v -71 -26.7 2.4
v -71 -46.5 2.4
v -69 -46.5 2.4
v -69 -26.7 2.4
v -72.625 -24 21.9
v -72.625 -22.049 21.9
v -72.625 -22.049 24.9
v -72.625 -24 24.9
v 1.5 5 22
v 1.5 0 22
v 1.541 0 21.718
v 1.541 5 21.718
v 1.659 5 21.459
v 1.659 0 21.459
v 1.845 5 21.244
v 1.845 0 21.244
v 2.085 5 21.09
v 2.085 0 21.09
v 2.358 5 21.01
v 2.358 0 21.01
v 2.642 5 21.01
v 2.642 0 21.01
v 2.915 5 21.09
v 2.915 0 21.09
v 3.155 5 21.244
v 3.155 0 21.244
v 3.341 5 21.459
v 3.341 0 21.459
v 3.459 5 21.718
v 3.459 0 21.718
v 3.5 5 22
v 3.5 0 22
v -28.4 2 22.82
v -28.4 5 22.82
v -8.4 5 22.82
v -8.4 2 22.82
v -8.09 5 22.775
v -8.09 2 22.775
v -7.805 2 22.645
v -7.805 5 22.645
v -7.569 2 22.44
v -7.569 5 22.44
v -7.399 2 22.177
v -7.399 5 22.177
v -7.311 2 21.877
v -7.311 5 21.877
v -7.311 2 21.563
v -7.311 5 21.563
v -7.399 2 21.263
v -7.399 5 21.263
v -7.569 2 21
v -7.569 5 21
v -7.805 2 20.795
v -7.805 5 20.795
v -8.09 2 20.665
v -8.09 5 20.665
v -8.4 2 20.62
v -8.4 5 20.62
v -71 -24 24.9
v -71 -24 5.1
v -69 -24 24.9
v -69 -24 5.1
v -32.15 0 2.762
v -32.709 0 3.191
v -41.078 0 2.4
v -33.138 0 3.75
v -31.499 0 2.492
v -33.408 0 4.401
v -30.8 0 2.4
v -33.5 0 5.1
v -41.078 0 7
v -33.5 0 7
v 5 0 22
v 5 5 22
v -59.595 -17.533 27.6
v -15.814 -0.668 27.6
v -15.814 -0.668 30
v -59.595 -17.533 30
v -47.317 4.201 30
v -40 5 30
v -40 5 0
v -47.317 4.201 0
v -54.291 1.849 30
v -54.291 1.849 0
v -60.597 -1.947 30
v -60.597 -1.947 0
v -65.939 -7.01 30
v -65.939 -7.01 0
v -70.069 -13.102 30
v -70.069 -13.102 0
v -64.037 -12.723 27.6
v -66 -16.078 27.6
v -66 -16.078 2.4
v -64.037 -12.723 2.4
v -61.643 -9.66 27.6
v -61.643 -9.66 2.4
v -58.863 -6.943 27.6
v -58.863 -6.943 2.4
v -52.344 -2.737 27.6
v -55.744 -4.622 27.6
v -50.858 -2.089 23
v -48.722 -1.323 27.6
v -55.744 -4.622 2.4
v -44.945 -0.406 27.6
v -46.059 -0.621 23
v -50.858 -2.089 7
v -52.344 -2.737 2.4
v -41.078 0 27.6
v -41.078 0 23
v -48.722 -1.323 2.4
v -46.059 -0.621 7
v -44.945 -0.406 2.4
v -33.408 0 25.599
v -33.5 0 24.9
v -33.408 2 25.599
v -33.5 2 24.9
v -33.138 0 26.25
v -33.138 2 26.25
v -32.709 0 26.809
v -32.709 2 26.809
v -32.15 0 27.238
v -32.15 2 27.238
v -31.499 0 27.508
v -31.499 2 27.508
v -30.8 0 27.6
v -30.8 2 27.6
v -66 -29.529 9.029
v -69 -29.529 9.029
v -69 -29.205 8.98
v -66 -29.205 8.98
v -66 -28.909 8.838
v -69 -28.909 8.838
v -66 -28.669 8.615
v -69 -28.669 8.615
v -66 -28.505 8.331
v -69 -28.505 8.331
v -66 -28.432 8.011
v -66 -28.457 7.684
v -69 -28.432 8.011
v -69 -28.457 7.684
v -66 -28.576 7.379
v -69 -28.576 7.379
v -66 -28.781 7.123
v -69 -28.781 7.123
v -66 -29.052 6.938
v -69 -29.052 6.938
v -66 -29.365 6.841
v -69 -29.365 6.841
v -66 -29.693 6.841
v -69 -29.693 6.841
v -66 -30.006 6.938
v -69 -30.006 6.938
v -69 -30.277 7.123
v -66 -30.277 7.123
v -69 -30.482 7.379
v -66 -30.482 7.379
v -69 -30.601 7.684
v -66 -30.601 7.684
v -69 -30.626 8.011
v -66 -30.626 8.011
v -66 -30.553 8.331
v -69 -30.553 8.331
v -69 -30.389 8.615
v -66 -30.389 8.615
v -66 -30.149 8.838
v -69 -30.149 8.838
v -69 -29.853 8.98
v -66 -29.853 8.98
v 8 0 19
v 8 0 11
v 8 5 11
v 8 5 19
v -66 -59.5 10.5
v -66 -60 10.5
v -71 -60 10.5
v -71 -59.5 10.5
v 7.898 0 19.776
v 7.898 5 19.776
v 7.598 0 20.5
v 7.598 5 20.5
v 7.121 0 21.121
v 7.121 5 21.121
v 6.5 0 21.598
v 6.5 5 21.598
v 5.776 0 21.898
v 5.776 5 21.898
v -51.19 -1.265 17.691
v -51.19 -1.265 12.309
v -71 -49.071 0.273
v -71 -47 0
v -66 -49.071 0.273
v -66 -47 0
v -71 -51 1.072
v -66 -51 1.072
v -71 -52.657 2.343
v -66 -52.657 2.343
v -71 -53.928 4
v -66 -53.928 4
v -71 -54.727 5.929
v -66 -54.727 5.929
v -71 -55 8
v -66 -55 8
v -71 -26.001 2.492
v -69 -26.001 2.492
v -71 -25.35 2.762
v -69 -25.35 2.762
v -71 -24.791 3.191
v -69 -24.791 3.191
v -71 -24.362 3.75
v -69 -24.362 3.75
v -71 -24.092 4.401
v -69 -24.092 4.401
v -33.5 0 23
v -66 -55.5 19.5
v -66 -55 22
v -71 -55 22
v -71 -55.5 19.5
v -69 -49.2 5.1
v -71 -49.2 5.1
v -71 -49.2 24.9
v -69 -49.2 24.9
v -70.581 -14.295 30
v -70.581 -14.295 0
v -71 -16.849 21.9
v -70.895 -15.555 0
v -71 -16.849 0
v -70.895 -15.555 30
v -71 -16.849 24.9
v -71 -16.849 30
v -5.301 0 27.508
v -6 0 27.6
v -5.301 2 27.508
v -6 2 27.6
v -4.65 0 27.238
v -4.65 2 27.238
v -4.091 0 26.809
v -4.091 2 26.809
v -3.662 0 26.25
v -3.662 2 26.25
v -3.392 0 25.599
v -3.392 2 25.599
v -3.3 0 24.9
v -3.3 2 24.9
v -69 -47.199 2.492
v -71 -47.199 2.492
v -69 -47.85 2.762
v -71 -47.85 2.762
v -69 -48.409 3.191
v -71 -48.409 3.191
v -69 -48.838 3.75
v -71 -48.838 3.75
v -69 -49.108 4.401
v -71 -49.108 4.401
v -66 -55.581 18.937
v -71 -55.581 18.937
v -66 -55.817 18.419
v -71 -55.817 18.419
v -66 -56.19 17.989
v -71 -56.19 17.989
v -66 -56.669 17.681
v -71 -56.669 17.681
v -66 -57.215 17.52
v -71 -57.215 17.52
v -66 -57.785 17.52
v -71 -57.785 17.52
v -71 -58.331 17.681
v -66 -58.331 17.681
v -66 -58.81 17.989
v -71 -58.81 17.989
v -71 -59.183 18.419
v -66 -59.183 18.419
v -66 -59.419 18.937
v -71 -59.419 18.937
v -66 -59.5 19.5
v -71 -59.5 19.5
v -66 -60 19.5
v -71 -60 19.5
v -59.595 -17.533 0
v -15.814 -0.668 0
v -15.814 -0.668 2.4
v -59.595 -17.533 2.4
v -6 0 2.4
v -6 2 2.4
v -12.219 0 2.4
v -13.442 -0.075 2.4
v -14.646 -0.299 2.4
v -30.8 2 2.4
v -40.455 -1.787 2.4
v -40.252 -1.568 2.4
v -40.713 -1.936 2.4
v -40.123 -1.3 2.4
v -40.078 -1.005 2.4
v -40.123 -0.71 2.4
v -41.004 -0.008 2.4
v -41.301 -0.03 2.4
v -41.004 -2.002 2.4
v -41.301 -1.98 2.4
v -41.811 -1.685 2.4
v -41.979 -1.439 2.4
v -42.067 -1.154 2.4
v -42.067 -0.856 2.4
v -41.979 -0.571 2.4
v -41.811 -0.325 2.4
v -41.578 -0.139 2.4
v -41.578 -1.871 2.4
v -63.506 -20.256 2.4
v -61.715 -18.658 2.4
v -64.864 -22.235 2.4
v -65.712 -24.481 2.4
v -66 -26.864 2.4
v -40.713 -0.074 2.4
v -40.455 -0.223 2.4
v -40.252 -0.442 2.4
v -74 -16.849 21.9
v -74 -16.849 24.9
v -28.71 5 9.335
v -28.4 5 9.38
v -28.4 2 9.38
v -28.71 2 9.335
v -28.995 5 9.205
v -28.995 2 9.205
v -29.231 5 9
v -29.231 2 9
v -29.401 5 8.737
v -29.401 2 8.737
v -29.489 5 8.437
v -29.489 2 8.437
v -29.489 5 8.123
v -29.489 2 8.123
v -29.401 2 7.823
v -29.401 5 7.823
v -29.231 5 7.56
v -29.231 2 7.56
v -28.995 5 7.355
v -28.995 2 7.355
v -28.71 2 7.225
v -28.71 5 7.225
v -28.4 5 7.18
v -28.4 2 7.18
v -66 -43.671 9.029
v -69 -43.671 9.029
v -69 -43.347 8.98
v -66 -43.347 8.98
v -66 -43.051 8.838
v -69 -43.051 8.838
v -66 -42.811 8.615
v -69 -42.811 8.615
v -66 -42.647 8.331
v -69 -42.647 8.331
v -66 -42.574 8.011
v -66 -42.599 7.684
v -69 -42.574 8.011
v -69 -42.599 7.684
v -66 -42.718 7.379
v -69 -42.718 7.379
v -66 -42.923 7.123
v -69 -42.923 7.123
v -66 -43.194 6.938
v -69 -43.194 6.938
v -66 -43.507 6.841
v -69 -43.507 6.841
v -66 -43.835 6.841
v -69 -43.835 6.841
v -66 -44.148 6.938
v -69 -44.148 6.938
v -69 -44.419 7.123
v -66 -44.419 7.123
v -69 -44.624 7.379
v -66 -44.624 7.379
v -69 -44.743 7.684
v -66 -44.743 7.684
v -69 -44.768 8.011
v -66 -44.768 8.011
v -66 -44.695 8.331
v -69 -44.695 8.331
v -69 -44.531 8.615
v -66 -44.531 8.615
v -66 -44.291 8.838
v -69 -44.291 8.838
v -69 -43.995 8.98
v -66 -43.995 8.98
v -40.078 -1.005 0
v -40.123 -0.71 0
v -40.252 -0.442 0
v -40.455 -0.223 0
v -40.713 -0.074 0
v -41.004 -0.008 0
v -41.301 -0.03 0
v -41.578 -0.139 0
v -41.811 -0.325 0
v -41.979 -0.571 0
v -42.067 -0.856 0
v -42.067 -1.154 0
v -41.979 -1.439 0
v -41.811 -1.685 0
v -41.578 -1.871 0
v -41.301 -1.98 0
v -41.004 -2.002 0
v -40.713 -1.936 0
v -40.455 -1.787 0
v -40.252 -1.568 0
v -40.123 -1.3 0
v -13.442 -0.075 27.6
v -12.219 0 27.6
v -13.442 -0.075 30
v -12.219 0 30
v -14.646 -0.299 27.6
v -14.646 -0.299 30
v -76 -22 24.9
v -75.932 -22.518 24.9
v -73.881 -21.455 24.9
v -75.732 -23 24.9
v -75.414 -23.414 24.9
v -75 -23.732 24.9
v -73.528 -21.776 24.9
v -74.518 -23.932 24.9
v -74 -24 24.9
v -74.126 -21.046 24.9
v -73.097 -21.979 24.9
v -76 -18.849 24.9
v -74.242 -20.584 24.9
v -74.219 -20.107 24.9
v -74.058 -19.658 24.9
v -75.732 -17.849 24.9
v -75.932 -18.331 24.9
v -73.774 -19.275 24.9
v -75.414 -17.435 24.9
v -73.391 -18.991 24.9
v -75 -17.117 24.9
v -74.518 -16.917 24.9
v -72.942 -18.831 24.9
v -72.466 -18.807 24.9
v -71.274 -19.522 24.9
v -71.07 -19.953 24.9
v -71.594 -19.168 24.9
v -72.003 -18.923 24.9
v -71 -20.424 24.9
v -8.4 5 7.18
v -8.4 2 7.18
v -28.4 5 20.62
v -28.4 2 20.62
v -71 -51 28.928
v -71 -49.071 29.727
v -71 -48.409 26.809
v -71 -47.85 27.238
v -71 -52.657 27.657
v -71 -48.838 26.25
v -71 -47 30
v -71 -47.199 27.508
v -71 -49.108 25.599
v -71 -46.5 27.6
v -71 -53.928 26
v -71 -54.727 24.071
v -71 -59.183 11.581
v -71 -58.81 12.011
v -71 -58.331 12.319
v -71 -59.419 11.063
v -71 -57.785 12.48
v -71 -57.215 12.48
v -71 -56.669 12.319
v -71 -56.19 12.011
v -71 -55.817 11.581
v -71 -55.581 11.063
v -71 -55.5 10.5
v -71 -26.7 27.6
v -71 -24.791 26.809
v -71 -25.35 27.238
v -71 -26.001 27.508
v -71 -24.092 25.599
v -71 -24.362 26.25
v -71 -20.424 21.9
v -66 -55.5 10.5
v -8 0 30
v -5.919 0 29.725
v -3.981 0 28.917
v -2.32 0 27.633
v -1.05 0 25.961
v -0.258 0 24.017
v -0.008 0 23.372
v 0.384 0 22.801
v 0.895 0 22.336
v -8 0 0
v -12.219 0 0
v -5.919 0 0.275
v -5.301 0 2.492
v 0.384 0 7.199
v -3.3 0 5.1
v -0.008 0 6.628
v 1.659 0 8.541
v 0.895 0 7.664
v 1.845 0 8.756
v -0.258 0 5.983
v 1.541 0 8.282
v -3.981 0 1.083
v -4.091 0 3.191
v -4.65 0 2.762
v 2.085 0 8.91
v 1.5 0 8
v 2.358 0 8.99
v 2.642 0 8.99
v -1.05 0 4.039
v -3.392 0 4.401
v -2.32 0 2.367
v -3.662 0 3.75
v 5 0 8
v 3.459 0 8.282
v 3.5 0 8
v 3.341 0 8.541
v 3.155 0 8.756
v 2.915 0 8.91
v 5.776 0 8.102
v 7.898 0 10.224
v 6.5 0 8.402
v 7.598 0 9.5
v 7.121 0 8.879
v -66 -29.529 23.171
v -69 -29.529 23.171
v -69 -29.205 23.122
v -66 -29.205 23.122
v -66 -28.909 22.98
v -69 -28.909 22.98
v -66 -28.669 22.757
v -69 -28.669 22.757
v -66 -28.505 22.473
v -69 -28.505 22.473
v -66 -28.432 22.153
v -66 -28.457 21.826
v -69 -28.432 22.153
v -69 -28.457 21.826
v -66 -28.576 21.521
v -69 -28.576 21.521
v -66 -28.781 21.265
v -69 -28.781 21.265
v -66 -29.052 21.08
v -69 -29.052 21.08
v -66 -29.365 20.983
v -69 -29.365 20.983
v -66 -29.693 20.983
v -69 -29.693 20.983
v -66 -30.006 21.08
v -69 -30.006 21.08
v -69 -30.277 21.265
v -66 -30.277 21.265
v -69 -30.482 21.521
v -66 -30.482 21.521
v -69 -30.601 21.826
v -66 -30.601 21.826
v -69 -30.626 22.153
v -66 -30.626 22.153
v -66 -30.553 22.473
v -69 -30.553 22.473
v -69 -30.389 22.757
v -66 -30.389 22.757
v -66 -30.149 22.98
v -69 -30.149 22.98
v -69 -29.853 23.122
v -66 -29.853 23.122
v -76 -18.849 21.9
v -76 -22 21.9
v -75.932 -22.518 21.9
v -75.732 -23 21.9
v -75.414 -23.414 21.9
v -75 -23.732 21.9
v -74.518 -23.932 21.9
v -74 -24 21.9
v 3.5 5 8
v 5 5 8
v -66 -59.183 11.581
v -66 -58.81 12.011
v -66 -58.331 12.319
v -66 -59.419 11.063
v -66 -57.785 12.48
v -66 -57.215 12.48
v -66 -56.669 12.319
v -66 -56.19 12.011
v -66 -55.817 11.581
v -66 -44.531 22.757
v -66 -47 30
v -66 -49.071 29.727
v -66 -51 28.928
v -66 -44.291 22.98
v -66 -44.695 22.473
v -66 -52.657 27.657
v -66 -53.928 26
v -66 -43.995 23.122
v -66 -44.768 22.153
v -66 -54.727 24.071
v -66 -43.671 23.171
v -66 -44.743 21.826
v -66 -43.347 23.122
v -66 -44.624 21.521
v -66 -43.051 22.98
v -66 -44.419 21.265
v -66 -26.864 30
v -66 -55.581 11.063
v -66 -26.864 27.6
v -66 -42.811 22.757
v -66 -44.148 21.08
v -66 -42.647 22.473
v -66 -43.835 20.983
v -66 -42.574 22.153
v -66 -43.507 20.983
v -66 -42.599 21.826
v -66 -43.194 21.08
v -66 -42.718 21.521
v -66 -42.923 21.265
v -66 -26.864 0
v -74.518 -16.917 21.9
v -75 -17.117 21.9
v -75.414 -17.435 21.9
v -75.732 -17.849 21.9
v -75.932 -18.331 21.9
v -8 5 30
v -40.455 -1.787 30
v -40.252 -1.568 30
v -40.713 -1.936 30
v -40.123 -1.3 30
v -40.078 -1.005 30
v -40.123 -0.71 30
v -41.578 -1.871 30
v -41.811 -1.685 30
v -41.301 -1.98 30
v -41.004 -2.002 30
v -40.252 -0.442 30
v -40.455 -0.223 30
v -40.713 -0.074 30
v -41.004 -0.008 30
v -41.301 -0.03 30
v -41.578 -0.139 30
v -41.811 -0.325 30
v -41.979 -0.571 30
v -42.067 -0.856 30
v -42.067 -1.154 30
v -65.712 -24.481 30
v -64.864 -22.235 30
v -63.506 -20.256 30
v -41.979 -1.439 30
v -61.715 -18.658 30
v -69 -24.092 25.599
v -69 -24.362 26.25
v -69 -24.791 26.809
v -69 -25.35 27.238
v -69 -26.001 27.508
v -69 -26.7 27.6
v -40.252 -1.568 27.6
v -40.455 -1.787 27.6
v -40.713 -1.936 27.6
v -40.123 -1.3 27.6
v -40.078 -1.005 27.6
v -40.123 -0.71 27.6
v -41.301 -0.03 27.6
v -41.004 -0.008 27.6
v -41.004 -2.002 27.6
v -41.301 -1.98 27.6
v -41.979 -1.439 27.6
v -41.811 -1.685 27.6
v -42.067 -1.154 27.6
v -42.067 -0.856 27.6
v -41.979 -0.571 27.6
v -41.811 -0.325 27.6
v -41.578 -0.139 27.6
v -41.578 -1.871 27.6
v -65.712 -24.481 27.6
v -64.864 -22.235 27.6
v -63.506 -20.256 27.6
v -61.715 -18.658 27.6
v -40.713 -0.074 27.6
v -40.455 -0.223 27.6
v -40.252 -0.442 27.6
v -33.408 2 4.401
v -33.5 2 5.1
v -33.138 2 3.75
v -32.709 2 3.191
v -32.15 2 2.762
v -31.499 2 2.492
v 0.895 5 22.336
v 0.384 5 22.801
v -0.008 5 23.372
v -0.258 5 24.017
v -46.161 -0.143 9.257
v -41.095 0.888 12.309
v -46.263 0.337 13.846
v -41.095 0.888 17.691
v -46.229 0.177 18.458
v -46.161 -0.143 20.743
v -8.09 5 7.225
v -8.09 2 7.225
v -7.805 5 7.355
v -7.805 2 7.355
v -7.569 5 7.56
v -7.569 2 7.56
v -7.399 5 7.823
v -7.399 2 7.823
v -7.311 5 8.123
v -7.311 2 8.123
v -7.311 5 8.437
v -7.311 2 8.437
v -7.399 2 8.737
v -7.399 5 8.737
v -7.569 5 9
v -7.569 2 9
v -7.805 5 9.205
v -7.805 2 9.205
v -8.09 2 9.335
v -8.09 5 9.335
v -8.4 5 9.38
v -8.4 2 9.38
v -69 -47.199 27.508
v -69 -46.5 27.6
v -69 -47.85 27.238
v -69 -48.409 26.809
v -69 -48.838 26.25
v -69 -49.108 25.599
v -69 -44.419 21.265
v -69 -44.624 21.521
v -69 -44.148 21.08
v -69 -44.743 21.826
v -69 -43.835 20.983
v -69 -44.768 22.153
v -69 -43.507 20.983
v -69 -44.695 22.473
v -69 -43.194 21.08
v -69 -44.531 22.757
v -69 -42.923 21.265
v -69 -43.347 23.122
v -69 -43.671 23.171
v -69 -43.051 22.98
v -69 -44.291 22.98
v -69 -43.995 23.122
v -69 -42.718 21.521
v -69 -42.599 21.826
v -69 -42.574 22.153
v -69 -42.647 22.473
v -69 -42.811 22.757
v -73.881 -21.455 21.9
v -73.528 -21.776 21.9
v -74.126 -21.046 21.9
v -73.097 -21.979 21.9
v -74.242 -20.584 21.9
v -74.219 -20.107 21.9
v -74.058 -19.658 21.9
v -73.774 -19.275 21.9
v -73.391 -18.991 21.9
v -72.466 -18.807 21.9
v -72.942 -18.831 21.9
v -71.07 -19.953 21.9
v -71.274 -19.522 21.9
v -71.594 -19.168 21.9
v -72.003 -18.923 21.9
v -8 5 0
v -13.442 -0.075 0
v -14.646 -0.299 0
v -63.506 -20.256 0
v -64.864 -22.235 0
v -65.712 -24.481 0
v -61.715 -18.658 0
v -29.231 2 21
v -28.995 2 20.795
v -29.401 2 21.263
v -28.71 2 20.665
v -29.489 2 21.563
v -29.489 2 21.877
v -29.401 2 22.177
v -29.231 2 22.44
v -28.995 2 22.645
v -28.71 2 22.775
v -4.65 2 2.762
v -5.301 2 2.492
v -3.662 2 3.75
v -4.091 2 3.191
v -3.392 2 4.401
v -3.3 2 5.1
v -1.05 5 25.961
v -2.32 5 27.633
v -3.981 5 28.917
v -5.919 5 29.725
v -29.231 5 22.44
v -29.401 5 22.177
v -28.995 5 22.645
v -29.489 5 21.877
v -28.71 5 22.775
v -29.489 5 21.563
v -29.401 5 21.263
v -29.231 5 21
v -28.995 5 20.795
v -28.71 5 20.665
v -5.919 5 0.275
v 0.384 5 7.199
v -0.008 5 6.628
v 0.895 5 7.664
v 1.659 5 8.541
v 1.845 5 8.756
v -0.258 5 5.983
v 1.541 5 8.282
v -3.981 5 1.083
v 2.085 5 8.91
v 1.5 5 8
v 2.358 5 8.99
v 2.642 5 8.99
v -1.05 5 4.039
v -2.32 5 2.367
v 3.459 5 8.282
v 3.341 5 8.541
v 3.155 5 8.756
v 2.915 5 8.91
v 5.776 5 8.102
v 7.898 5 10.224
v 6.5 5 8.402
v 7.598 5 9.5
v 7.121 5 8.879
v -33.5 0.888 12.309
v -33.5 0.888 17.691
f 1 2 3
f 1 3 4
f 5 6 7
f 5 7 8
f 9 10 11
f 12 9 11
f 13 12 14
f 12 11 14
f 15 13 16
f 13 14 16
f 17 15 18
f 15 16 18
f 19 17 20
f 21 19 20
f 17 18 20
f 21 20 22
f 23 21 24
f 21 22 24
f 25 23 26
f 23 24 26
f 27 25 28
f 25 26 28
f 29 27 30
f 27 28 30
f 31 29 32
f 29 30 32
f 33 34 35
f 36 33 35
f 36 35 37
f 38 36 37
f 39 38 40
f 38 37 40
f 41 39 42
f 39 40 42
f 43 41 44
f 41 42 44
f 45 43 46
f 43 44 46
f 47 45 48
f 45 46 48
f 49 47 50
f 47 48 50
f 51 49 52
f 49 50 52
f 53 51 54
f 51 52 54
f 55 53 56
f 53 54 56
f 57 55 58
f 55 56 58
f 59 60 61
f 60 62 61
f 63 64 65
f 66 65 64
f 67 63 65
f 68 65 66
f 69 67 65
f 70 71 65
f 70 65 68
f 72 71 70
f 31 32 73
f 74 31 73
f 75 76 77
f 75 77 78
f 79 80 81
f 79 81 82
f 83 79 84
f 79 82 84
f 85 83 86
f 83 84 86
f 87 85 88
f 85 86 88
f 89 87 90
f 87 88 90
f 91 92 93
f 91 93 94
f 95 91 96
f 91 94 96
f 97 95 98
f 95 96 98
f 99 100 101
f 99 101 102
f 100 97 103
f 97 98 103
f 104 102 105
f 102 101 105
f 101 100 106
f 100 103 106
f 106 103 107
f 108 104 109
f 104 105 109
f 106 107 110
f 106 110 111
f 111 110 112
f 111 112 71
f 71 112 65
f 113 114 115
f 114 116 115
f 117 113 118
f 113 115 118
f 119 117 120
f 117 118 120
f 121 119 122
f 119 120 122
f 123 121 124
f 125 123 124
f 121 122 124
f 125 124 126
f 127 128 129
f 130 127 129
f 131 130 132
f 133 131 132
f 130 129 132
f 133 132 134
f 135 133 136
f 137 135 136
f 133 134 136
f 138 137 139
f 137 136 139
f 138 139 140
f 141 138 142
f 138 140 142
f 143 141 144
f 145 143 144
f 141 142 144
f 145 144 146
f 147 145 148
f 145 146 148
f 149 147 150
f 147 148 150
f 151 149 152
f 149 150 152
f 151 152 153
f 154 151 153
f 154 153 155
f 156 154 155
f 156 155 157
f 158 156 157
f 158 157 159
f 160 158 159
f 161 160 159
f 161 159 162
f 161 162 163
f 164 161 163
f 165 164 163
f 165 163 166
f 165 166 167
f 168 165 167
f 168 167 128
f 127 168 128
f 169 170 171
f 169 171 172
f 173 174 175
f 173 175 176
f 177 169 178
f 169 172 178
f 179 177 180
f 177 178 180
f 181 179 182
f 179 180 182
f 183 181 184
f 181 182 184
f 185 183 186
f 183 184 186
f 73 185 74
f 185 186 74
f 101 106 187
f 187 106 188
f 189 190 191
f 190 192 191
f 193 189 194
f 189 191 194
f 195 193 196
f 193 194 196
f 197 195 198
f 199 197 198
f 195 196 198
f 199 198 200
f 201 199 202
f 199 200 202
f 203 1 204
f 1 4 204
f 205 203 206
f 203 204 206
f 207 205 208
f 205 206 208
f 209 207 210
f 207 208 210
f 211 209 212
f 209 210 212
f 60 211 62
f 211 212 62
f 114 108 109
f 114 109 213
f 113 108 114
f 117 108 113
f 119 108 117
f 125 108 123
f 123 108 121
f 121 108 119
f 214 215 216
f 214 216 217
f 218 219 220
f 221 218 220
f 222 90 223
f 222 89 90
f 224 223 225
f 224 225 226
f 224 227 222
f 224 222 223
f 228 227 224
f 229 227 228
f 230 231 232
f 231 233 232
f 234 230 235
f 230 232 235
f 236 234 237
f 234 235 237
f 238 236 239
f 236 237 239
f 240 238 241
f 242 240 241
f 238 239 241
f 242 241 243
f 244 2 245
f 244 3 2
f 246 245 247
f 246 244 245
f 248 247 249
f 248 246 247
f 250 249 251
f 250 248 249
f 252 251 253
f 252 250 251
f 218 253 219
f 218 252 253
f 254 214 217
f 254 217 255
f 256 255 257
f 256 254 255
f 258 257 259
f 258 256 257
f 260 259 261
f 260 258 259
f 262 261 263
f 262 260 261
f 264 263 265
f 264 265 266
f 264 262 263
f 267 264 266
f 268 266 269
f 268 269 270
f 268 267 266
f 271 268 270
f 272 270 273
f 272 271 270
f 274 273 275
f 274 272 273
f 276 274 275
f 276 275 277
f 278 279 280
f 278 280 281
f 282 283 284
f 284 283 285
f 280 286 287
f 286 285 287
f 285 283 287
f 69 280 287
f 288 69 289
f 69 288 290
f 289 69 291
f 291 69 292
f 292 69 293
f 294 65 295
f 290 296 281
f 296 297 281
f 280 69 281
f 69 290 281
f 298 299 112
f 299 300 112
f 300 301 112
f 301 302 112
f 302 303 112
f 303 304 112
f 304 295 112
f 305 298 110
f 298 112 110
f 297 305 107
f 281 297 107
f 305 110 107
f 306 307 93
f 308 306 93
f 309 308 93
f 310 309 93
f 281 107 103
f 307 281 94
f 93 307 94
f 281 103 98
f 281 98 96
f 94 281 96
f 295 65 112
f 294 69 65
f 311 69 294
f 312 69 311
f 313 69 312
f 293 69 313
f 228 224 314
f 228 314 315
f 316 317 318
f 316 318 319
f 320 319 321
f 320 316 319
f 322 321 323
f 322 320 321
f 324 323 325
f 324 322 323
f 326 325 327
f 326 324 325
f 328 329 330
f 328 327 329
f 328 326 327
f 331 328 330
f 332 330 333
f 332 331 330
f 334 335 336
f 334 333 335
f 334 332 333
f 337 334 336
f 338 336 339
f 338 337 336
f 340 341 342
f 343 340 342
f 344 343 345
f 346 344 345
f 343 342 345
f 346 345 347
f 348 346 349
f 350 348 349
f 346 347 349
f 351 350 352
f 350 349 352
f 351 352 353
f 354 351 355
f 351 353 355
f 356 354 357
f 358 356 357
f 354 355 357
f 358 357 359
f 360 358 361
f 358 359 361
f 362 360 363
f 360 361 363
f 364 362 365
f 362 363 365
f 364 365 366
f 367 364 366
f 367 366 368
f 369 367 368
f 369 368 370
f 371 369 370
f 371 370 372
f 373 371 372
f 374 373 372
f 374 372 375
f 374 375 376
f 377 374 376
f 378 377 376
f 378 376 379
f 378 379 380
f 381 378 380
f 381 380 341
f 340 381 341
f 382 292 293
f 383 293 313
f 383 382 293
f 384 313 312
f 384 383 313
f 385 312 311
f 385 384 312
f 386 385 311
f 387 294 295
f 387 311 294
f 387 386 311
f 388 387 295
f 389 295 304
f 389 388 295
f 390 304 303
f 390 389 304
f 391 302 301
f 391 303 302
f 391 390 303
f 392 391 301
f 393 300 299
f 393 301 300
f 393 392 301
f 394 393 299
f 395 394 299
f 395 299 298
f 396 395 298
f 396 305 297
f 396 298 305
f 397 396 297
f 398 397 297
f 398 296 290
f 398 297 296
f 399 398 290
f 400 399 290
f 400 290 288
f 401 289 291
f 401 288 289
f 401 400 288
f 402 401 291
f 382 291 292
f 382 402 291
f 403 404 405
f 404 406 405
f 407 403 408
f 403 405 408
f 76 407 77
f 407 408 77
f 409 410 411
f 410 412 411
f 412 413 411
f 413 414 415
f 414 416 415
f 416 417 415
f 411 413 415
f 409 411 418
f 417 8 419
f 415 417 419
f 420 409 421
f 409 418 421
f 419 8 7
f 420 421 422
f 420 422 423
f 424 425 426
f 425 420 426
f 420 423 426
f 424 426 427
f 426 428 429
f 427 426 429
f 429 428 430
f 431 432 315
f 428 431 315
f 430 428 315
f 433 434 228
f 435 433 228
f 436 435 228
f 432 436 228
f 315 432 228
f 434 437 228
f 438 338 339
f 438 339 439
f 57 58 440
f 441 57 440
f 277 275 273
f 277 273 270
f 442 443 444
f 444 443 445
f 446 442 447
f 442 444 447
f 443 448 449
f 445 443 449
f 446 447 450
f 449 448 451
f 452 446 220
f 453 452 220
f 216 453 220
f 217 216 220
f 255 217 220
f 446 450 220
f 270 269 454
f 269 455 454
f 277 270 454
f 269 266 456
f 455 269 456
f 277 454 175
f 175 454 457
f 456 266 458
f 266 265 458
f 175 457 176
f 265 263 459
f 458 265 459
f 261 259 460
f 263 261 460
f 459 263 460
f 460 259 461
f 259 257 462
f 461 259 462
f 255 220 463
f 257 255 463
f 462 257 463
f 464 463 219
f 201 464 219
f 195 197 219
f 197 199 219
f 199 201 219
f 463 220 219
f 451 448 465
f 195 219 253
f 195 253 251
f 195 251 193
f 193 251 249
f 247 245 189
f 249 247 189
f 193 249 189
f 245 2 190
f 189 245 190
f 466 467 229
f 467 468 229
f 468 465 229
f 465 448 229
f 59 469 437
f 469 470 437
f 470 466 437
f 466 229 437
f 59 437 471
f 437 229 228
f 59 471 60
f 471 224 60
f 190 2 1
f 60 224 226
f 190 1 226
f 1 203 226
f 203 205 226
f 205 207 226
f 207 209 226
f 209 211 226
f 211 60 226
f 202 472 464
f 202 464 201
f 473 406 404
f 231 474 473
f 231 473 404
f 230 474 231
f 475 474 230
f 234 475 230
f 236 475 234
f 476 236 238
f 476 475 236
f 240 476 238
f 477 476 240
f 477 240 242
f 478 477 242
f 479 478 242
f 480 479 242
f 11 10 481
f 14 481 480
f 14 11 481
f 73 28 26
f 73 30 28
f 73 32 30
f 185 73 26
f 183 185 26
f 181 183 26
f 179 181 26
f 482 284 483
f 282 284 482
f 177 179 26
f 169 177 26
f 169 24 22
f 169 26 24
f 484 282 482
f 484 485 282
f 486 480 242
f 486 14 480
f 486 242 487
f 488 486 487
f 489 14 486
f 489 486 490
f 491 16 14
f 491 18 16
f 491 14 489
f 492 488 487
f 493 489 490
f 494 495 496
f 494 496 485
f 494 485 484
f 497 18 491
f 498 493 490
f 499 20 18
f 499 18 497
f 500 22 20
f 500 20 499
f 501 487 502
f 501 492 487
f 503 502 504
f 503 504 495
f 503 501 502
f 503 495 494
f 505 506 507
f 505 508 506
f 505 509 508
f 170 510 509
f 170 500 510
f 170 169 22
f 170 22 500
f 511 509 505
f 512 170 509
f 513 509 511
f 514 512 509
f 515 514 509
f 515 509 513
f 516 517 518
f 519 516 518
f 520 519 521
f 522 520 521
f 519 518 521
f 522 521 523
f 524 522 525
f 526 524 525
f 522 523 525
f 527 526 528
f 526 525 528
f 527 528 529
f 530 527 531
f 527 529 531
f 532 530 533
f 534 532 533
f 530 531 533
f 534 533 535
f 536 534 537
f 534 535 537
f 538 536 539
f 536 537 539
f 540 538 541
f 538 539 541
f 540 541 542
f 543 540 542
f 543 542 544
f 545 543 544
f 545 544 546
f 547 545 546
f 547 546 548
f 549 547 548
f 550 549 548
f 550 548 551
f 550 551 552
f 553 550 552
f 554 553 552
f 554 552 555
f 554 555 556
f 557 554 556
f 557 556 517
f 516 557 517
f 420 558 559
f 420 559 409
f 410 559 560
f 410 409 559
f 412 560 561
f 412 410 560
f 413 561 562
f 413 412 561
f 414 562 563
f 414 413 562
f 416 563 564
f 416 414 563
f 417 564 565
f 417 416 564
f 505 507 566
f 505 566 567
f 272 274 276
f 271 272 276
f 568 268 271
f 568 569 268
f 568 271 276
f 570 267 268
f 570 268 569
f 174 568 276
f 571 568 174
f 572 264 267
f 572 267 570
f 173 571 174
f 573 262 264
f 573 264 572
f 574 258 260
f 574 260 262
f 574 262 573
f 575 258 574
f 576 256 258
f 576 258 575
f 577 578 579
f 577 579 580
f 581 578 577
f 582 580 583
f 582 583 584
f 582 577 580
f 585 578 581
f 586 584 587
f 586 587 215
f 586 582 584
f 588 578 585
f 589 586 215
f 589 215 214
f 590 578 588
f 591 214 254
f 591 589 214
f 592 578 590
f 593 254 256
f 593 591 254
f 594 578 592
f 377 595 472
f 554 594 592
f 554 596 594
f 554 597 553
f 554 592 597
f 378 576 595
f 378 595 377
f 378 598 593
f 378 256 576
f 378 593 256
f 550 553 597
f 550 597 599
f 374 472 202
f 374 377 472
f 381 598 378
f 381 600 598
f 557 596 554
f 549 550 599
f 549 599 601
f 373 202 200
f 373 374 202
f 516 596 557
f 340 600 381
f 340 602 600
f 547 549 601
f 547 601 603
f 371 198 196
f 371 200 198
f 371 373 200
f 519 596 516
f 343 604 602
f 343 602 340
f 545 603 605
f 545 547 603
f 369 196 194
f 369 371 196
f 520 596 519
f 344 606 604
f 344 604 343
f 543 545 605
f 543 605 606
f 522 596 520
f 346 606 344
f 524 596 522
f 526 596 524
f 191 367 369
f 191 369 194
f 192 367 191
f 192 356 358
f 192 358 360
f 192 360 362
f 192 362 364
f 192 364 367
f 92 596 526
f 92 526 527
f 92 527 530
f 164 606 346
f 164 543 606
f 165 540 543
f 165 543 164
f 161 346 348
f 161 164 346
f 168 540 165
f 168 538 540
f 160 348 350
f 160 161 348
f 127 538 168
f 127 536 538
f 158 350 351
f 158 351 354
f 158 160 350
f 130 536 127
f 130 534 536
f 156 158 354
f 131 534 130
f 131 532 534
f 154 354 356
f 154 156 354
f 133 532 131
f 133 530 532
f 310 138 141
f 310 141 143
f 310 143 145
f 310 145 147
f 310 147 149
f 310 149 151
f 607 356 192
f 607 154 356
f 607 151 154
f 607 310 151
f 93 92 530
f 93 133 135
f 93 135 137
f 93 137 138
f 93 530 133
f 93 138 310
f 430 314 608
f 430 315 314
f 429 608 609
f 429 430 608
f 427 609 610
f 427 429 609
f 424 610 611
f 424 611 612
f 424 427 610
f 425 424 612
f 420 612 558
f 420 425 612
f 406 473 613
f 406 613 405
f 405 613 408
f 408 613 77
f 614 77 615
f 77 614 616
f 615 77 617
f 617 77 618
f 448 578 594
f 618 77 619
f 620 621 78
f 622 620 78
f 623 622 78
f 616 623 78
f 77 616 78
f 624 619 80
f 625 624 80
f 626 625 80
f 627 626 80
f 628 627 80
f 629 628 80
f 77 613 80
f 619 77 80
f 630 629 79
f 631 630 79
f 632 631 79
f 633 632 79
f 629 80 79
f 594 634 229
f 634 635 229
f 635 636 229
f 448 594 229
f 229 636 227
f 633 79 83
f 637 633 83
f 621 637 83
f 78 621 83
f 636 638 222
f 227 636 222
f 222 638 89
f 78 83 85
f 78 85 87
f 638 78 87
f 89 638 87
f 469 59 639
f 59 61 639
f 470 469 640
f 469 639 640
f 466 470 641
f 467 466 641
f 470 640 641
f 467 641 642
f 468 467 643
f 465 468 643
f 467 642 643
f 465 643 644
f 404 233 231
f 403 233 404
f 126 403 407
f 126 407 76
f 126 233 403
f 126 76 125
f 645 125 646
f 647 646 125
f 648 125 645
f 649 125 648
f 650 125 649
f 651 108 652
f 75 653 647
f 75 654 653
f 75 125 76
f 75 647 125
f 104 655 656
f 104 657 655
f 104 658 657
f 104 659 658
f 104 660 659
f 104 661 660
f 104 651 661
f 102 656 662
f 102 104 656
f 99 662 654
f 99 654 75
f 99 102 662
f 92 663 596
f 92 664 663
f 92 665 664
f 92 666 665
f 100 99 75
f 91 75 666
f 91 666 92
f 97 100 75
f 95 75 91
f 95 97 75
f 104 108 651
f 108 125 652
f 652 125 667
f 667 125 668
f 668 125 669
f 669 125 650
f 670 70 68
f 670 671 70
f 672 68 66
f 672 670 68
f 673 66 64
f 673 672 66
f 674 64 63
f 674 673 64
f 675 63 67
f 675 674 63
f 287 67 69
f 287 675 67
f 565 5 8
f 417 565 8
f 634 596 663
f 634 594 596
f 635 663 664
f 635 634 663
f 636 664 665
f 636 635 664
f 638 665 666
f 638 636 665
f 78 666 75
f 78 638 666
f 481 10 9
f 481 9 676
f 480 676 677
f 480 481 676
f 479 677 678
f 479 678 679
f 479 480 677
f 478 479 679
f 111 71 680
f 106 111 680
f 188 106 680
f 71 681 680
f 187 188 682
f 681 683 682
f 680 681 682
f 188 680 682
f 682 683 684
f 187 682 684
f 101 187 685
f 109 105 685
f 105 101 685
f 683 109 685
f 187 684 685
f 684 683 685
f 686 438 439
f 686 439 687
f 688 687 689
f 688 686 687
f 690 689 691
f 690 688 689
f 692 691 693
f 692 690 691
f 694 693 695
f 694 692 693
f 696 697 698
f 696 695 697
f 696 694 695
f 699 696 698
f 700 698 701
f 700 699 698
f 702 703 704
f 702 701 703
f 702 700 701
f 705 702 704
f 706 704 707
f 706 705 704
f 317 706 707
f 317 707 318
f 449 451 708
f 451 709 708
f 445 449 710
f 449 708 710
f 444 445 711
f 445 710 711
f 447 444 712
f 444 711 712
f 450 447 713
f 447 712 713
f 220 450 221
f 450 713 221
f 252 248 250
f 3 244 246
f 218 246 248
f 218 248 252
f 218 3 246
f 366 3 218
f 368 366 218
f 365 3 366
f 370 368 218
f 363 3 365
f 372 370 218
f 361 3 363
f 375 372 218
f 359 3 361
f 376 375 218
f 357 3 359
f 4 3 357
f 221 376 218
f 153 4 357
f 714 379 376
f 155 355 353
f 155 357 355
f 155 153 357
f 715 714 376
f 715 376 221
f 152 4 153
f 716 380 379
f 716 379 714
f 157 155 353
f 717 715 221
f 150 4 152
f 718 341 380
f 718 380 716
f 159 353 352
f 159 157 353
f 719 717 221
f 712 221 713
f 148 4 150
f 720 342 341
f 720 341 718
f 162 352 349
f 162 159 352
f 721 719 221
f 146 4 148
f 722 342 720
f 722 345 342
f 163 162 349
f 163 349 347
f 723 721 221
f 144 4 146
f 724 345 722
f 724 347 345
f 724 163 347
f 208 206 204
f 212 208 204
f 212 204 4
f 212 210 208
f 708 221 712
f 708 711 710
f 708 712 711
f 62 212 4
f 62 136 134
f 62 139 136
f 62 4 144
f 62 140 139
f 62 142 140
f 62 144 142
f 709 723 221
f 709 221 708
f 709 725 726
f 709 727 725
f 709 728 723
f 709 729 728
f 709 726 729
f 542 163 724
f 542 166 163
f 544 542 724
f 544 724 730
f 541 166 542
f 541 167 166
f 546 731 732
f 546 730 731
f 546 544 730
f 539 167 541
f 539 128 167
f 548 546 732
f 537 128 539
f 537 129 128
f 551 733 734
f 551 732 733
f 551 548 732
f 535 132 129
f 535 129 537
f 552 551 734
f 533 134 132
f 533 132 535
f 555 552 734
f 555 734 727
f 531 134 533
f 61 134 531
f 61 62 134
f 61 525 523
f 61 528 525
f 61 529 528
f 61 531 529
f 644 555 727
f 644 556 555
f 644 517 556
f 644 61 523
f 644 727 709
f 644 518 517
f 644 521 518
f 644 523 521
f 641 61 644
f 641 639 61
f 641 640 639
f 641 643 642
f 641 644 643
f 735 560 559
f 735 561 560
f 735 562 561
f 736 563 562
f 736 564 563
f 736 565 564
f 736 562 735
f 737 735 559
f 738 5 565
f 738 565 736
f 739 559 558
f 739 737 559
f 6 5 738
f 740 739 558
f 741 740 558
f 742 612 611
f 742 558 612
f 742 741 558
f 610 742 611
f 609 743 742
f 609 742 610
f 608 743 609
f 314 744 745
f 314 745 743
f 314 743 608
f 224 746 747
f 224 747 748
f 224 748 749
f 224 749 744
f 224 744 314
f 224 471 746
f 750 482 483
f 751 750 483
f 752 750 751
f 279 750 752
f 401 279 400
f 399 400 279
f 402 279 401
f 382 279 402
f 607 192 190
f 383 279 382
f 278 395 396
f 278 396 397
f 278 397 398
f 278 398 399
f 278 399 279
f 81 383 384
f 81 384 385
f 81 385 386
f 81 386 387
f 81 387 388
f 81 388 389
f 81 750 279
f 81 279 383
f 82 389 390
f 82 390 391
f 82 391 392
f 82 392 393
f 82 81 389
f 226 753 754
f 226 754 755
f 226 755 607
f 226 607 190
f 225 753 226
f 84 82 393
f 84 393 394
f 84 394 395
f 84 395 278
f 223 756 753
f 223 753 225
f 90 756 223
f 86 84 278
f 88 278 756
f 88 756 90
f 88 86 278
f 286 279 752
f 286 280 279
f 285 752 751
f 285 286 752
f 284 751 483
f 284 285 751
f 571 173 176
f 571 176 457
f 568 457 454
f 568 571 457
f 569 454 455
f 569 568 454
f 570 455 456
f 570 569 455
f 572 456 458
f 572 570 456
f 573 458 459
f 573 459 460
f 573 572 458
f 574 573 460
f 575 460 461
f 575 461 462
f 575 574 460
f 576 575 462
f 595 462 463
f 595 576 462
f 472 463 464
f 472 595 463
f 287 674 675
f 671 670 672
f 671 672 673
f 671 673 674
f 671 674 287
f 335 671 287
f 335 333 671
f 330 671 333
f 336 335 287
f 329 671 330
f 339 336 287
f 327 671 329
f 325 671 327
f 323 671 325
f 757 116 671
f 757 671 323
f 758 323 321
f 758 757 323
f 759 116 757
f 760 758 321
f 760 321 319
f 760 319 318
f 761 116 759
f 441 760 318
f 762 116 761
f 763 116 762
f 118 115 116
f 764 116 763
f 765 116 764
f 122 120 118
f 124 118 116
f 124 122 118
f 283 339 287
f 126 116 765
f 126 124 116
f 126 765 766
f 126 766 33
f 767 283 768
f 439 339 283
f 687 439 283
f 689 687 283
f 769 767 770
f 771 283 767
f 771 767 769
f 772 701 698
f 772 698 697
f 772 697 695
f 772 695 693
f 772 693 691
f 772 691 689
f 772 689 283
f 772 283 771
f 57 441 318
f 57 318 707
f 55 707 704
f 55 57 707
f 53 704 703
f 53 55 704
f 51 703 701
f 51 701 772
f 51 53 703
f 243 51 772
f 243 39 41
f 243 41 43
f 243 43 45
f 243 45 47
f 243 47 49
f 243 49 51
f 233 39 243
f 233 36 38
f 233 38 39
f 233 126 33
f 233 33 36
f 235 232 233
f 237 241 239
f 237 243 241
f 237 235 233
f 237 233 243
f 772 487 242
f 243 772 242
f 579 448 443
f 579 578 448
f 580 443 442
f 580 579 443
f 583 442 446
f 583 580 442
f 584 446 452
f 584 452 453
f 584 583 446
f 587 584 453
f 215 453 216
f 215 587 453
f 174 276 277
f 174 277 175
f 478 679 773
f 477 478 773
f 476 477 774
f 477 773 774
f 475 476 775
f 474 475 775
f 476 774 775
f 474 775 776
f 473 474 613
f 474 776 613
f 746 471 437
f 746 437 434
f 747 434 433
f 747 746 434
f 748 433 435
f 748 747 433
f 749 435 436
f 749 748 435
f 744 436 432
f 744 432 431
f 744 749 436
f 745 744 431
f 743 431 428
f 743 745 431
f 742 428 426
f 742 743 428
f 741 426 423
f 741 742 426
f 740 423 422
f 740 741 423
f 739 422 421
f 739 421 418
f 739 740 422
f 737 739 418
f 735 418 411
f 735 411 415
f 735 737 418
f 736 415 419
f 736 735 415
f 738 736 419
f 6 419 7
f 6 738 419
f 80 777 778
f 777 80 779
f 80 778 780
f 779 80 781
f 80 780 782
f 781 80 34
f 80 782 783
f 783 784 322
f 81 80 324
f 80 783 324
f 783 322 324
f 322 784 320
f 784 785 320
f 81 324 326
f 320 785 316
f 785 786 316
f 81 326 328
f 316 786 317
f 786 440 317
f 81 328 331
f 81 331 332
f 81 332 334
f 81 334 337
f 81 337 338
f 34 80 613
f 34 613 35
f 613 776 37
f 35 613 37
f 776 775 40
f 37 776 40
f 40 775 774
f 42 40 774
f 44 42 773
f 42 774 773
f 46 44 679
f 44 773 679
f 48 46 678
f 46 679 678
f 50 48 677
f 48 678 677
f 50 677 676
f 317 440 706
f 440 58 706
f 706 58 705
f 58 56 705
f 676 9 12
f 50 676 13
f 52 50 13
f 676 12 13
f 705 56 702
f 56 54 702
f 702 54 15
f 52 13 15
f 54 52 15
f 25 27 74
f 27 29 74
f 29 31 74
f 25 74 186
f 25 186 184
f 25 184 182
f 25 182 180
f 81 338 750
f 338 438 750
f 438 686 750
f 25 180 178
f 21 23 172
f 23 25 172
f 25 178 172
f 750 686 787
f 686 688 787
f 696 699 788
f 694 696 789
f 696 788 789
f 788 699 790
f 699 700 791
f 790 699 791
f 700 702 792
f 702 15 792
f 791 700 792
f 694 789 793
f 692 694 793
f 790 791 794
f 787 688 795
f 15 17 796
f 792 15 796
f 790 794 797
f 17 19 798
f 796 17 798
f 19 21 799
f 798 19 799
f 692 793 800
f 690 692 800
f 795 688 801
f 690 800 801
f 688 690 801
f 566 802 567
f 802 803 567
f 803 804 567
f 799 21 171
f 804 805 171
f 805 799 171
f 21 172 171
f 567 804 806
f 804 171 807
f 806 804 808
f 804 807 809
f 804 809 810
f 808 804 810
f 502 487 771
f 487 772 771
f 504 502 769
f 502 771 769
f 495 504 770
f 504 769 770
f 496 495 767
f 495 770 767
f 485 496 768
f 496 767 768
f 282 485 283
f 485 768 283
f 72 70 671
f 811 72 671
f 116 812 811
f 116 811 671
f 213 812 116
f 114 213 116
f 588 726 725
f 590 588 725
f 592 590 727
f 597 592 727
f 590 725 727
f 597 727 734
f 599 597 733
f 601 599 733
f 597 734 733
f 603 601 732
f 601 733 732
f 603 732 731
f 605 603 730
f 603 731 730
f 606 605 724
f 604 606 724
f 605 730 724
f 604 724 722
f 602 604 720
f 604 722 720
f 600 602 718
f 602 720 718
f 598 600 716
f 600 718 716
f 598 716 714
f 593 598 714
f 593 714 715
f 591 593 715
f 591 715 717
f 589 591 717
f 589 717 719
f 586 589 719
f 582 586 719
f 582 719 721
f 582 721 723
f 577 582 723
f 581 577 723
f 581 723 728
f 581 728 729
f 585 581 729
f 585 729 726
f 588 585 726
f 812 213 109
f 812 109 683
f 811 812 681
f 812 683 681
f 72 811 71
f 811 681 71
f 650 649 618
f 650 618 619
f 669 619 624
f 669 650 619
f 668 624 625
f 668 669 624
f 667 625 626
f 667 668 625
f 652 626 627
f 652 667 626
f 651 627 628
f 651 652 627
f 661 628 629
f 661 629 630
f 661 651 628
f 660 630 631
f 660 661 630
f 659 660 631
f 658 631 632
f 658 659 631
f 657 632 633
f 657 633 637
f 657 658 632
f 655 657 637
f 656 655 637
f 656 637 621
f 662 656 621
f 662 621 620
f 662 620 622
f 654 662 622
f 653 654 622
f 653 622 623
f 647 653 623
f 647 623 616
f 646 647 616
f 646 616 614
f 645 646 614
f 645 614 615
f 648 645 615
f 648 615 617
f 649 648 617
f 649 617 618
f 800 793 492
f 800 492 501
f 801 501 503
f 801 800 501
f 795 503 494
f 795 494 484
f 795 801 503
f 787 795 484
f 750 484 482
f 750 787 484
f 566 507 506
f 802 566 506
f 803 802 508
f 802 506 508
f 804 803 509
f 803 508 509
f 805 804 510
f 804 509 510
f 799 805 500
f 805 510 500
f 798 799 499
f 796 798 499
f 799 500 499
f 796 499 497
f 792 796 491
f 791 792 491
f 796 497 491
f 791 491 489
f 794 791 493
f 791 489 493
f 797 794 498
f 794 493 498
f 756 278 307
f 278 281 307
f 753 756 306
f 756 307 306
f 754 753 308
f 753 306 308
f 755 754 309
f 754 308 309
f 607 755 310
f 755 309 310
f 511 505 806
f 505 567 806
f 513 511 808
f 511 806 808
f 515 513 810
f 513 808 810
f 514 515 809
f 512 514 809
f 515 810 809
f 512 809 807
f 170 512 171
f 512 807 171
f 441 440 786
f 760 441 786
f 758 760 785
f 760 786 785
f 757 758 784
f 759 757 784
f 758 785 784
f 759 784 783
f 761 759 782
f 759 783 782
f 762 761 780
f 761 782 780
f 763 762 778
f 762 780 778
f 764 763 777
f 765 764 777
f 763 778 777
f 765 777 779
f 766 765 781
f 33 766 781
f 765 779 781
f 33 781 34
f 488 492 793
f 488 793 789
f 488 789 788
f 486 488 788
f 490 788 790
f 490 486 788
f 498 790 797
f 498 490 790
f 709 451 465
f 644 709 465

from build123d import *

# Parameters (mm, degrees)
SALIENTE_EXTRUIR1_DEPTH = 30
CORTAR_EXTRUIR1_DEPTH   = 5
CROQUIS3_W              = 30.2
CROQUIS3_H              = 25.2
CORTAR_EXTRUIR2_DEPTH   = 2
CROQUIS4_R              = 1.1
CORTAR_EXTRUIR3_DEPTH   = 5
CROQUIS5_W              = 25.2
CROQUIS5_H              = 25.2
CORTAR_EXTRUIR4_DEPTH   = 2
REDONDEO2_R             = 8
REDONDEO3_R             = 2.7
CROQUIS6_W              = 8
CROQUIS6_H              = 14
SALIENTE_EXTRUIR2_DEPTH = 5
REDONDEO4_R             = 3
SALIENTE_EXTRUIR4_START = -2.4
SALIENTE_EXTRUIR4_DEPTH = 2.4
SALIENTE_EXTRUIR5_START = -30
SALIENTE_EXTRUIR5_DEPTH = 2.4
REDONDEO5_R             = 10
SALIENTE_EXTRUIR6_START = -5
SALIENTE_EXTRUIR6_DEPTH = 5
CORTAR_EXTRUIR6_START   = -2.4
CROQUIS14_R             = 1
CORTAR_EXTRUIR6_DEPTH   = 30
CROQUIS18_W             = 3
CROQUIS18_H             = 7.151114147
SALIENTE_EXTRUIR7_DEPTH = 5
CORTAR_EXTRUIR7_START   = -3
CORTAR_EXTRUIR7_DEPTH   = 3
CROQUIS22_R             = 1
CORTAR_EXTRUIR8_DEPTH   = 5
REDONDEO8_R             = 2
REDONDEO6_R             = 3


with BuildPart() as part:
    # Croquis1 → Saliente-Extruir1 (new body)
    with BuildSketch(Plane.XY):
        with BuildLine():
            Line((0, 0), (0, 5))
            Line((0, 5), (-40, 5))
            ThreePointArc((-40, 5), (-58.443639467, -0.437358826), (-71, -15))
            Line((-71, -15), (-71, -55))
            Line((-71, -55), (-66, -55))
            Line((-66, -55), (-66, -16.078431373))
            ThreePointArc((-66, -16.078431373), (-55.744135615, -4.621589797), (-41.078431373, 0))
            Line((-41.078431373, 0), (0, 0))
        make_face()
    extrude(amount=SALIENTE_EXTRUIR1_DEPTH)

    # Croquis2 → Cortar-Extruir1 (cut)
    with BuildSketch(Plane(origin=(0, 5, 0), x_dir=(1, 0, 0), z_dir=(0, 1, 0))):
        with BuildLine():
            Line((-18.4, -7.18), (-8.4, -7.18))
            ThreePointArc((-8.4, -7.18), (-7.3, -8.28), (-8.4, -9.38))
            Line((-8.4, -9.38), (-28.4, -9.38))
            ThreePointArc((-28.4, -9.38), (-29.5, -8.28), (-28.4, -7.18))
            Line((-28.4, -7.18), (-18.4, -7.18))
        make_face()
        with BuildLine():
            Line((-8.4, -20.62), (-28.4, -20.62))
            ThreePointArc((-28.4, -20.62), (-29.5, -21.72), (-28.4, -22.82))
            Line((-28.4, -22.82), (-18.4, -22.82))
            Line((-18.4, -22.82), (-8.4, -22.82))
            ThreePointArc((-8.4, -22.82), (-7.3, -21.72), (-8.4, -20.62))
        make_face()
    extrude(amount=-CORTAR_EXTRUIR1_DEPTH, mode=Mode.SUBTRACT)

    # Croquis3 → Cortar-Extruir2 (cut)
    with BuildSketch(Plane.XZ):
        with Locations((-18.4, 15)):
            Rectangle(CROQUIS3_W, CROQUIS3_H)
    extrude(amount=-CORTAR_EXTRUIR2_DEPTH, mode=Mode.SUBTRACT)

    # Croquis4 → Cortar-Extruir3 (cut)
    with BuildSketch(Plane.ZY.offset(71)):
        with Locations((22.071067812, -29.528932188)):
            Circle(CROQUIS4_R)
        with Locations((22.071067812, -43.671067812)):
            Circle(CROQUIS4_R)
        with Locations((7.928932188, -43.671067812)):
            Circle(CROQUIS4_R)
        with Locations((7.928932188, -29.528932188)):
            Circle(CROQUIS4_R)
    extrude(amount=-CORTAR_EXTRUIR3_DEPTH, mode=Mode.SUBTRACT)

    # Croquis5 → Cortar-Extruir4 (cut)
    with BuildSketch(Plane.ZY.offset(71)):
        with Locations((15, -36.6)):
            Rectangle(CROQUIS5_W, CROQUIS5_H)
    extrude(amount=-CORTAR_EXTRUIR4_DEPTH, mode=Mode.SUBTRACT)

    # Redondeo2
    redondeo2_edges = [part.edges().sort_by_distance(p)[0] for p in [
        (0, 2.5, 0),
        (-71, -15, 15),
        (-68.5, -55, 30),
        (0, 2.5, 30),
        (-68.5, -55, 0),
    ]]
    fillet(redondeo2_edges, radius=REDONDEO2_R)

    # Redondeo3
    redondeo3_edges = [part.edges().sort_by_distance(p)[0] for p in [
        (-70, -24, 27.6),
        (-70, -49.2, 27.6),
        (-70, -49.2, 2.4),
        (-70, -24, 2.4),
        (-3.3, 1, 27.6),
        (-3.3, 1, 2.4),
        (-33.5, 1, 2.4),
        (-33.5, 1, 27.6),
    ]]
    fillet(redondeo3_edges, radius=REDONDEO3_R)

    # Croquis6 → Saliente-Extruir2 (add)
    with BuildSketch(Plane.XZ):
        with Locations((4, 15)):
            Rectangle(CROQUIS6_W, CROQUIS6_H)
    extrude(amount=-SALIENTE_EXTRUIR2_DEPTH)

    # Redondeo4
    redondeo4_edges = [part.edges().sort_by_distance(p)[0] for p in [
        (8, 2.5, 8),
        (8, 2.5, 22),
    ]]
    fillet(redondeo4_edges, radius=REDONDEO4_R)

    # Croquis11 → Saliente-Extruir4 (add)
    with BuildSketch(Plane.XY.offset(30).offset(SALIENTE_EXTRUIR4_START)):
        with BuildLine():
            Line((-41.078431373, 0), (-14.078431373, 0))
            Line((-14.078431373, 0), (-66, -20))
            Line((-66, -20), (-66, -16.078431373))
            ThreePointArc((-66, -16.078431373), (-55.744135615, -4.621589797), (-41.078431373, 0))
        make_face()
    extrude(amount=SALIENTE_EXTRUIR4_DEPTH)

    # Croquis11<2> → Saliente-Extruir5 (add)
    with BuildSketch(Plane.XY.offset(30).offset(SALIENTE_EXTRUIR5_START)):
        with BuildLine():
            Line((-41.078431373, 0), (-14.078431373, 0))
            Line((-14.078431373, 0), (-66, -20))
            Line((-66, -20), (-66, -16.078431373))
            ThreePointArc((-66, -16.078431373), (-55.744135615, -4.621589797), (-41.078431373, 0))
        make_face()
    extrude(amount=SALIENTE_EXTRUIR5_DEPTH)

    # Redondeo5
    redondeo5_edges = [part.edges().sort_by_distance(p)[0] for p in [
        (-14.078431373, 0, 28.8),
        (-66, -20, 28.8),
        (-66, -20, 1.2),
        (-14.078431373, 0, 1.2),
    ]]
    fillet(redondeo5_edges, radius=REDONDEO5_R)

    # Croquis12 → Saliente-Extruir6 (add)
    with BuildSketch(Plane.ZY.offset(71).offset(SALIENTE_EXTRUIR6_START)):
        with BuildLine():
            Line((10.5, -55), (19.5, -55))
            Line((19.5, -55), (22, -55))
            Line((22, -55), (19.5, -55.5))
            ThreePointArc((19.5, -55.5), (17.5, -57.5), (19.5, -59.5))
            Line((19.5, -59.5), (19.5, -60))
            Line((19.5, -60), (10.5, -60))
            Line((10.5, -60), (10.5, -59.5))
            ThreePointArc((10.5, -59.5), (12.5, -57.5), (10.5, -55.5))
            Line((10.5, -55.5), (8, -55))
            Line((8, -55), (10.5, -55))
        make_face()
    extrude(amount=SALIENTE_EXTRUIR6_DEPTH)

    # Croquis14 → Cortar-Extruir6 (cut)
    with BuildSketch(Plane.XY.offset(2.4).offset(CORTAR_EXTRUIR6_START)):
        with Locations((-41.078431373, -1.005)):
            Circle(CROQUIS14_R)
    extrude(amount=CORTAR_EXTRUIR6_DEPTH, mode=Mode.SUBTRACT)

    # Croquis18 → Saliente-Extruir7 (add)
    with BuildSketch(Plane.ZY.offset(71)):
        with Locations((23.4, -20.424442926)):
            Rectangle(CROQUIS18_W, CROQUIS18_H)
    extrude(amount=SALIENTE_EXTRUIR7_DEPTH)

    # Croquis19 → Cortar-Extruir7 (cut)
    with BuildSketch(Plane.XY.offset(24.9).offset(CORTAR_EXTRUIR7_START)):
        with BuildLine():
            Line((-72.625, -22.049442927), (-72.625, -24))
            Line((-72.625, -24), (-71, -24))
            Line((-71, -24), (-71, -20.424442927))
            ThreePointArc((-71, -20.424442927), (-73.774048519, -19.275394407), (-72.625, -22.049442927))
        make_face()
    extrude(amount=CORTAR_EXTRUIR7_DEPTH, mode=Mode.SUBTRACT)

    # Croquis22 → Cortar-Extruir8 (cut)
    with BuildSketch(Plane.XZ):
        with Locations((2.5, 22)):
            Circle(CROQUIS22_R)
        with Locations((2.5, 8)):
            Circle(CROQUIS22_R)
    extrude(amount=-CORTAR_EXTRUIR8_DEPTH, mode=Mode.SUBTRACT)

    # Redondeo8
    redondeo8_edges = [part.edges().sort_by_distance(p)[0] for p in [
        (-76, -16.848885853, 23.4),
        (-76, -24, 23.4),
    ]]
    fillet(redondeo8_edges, radius=REDONDEO8_R)

    # Cortar-Barrer1: sweep along a path in Croquis23
    with BuildLine(Plane.XY.offset(2.4)) as cortar_barrer1_path:
        Line((-33.5, 0), (-41.078431373, 0))
        ThreePointArc((-41.078431373, 0), (-46.058616362, -0.620868951), (-50.857769, -2.089151876))
    # Croquis24 → Cortar-Barrer1 (sweep, cut)
    with BuildSketch(Plane(origin=(-33.5, 0, 0), x_dir=(0, 0, -1), z_dir=(1, 0, 0))):
        with BuildLine():
            Line((-7, 0), (-23, 0))
            ThreePointArc((-23, 0), (-15, 1), (-7, 0))
        make_face()
    sweep(path=cortar_barrer1_path.line, transition=Transition.RIGHT, mode=Mode.SUBTRACT)

    # Redondeo6
    # the kernel refuses this fillet: 3 mm, written as the material it adds along each edge
    with BuildSketch(Plane(origin=(0, 0, 8), x_dir=(-0.1270760613131033, 0, -0.9918929753966144), z_dir=(0, 1, 0))) as redondeo6_piece_1:
        with BuildLine():
            CenterArc((2.414445165, -2.975678926), REDONDEO6_R, 97.300661555, 52.967156255)
            Line((-0.190614092, -1.487839463), (-0.242715277, -1.458082674))
            ThreePointArc((-0.242715277, -1.458082674), (-0.154820625, -0.736295168), (-0.059513579, 0.007624564))
            Line((-0.059513579, 0.007624564), (0.007624564, 0.059513579))
            ThreePointArc((0.007624564, 0.059513579), (1.016608491, -0.004856197), (2.025592417, 0.059513579))
            Line((2.025592417, 0.059513579), (2.033216981, 0))
        make_face()
    extrude(amount=5)
    with BuildSketch(Plane(origin=(0, 0, 22), x_dir=(-0.12707606131310373, 0, 0.9918929753966141), z_dir=(0, 1, 0))) as redondeo6_piece_2:
        with BuildLine():
            CenterArc((2.414445165, 2.975678926), REDONDEO6_R, 209.73218219, 52.967156255)
            Line((-0.190614092, 1.487839463), (-0.242715277, 1.458082674))
            ThreePointArc((-0.242715277, 1.458082674), (-0.154820625, 0.736295168), (-0.059513579, -0.007624564))
            Line((-0.059513579, -0.007624564), (0.007624564, -0.059513579))
            ThreePointArc((0.007624564, -0.059513579), (1.016608491, 0.004856197), (2.025592417, -0.059513579))
            Line((2.025592417, -0.059513579), (2.033216981, 0))
        make_face()
    extrude(amount=5)


solid = part.part
